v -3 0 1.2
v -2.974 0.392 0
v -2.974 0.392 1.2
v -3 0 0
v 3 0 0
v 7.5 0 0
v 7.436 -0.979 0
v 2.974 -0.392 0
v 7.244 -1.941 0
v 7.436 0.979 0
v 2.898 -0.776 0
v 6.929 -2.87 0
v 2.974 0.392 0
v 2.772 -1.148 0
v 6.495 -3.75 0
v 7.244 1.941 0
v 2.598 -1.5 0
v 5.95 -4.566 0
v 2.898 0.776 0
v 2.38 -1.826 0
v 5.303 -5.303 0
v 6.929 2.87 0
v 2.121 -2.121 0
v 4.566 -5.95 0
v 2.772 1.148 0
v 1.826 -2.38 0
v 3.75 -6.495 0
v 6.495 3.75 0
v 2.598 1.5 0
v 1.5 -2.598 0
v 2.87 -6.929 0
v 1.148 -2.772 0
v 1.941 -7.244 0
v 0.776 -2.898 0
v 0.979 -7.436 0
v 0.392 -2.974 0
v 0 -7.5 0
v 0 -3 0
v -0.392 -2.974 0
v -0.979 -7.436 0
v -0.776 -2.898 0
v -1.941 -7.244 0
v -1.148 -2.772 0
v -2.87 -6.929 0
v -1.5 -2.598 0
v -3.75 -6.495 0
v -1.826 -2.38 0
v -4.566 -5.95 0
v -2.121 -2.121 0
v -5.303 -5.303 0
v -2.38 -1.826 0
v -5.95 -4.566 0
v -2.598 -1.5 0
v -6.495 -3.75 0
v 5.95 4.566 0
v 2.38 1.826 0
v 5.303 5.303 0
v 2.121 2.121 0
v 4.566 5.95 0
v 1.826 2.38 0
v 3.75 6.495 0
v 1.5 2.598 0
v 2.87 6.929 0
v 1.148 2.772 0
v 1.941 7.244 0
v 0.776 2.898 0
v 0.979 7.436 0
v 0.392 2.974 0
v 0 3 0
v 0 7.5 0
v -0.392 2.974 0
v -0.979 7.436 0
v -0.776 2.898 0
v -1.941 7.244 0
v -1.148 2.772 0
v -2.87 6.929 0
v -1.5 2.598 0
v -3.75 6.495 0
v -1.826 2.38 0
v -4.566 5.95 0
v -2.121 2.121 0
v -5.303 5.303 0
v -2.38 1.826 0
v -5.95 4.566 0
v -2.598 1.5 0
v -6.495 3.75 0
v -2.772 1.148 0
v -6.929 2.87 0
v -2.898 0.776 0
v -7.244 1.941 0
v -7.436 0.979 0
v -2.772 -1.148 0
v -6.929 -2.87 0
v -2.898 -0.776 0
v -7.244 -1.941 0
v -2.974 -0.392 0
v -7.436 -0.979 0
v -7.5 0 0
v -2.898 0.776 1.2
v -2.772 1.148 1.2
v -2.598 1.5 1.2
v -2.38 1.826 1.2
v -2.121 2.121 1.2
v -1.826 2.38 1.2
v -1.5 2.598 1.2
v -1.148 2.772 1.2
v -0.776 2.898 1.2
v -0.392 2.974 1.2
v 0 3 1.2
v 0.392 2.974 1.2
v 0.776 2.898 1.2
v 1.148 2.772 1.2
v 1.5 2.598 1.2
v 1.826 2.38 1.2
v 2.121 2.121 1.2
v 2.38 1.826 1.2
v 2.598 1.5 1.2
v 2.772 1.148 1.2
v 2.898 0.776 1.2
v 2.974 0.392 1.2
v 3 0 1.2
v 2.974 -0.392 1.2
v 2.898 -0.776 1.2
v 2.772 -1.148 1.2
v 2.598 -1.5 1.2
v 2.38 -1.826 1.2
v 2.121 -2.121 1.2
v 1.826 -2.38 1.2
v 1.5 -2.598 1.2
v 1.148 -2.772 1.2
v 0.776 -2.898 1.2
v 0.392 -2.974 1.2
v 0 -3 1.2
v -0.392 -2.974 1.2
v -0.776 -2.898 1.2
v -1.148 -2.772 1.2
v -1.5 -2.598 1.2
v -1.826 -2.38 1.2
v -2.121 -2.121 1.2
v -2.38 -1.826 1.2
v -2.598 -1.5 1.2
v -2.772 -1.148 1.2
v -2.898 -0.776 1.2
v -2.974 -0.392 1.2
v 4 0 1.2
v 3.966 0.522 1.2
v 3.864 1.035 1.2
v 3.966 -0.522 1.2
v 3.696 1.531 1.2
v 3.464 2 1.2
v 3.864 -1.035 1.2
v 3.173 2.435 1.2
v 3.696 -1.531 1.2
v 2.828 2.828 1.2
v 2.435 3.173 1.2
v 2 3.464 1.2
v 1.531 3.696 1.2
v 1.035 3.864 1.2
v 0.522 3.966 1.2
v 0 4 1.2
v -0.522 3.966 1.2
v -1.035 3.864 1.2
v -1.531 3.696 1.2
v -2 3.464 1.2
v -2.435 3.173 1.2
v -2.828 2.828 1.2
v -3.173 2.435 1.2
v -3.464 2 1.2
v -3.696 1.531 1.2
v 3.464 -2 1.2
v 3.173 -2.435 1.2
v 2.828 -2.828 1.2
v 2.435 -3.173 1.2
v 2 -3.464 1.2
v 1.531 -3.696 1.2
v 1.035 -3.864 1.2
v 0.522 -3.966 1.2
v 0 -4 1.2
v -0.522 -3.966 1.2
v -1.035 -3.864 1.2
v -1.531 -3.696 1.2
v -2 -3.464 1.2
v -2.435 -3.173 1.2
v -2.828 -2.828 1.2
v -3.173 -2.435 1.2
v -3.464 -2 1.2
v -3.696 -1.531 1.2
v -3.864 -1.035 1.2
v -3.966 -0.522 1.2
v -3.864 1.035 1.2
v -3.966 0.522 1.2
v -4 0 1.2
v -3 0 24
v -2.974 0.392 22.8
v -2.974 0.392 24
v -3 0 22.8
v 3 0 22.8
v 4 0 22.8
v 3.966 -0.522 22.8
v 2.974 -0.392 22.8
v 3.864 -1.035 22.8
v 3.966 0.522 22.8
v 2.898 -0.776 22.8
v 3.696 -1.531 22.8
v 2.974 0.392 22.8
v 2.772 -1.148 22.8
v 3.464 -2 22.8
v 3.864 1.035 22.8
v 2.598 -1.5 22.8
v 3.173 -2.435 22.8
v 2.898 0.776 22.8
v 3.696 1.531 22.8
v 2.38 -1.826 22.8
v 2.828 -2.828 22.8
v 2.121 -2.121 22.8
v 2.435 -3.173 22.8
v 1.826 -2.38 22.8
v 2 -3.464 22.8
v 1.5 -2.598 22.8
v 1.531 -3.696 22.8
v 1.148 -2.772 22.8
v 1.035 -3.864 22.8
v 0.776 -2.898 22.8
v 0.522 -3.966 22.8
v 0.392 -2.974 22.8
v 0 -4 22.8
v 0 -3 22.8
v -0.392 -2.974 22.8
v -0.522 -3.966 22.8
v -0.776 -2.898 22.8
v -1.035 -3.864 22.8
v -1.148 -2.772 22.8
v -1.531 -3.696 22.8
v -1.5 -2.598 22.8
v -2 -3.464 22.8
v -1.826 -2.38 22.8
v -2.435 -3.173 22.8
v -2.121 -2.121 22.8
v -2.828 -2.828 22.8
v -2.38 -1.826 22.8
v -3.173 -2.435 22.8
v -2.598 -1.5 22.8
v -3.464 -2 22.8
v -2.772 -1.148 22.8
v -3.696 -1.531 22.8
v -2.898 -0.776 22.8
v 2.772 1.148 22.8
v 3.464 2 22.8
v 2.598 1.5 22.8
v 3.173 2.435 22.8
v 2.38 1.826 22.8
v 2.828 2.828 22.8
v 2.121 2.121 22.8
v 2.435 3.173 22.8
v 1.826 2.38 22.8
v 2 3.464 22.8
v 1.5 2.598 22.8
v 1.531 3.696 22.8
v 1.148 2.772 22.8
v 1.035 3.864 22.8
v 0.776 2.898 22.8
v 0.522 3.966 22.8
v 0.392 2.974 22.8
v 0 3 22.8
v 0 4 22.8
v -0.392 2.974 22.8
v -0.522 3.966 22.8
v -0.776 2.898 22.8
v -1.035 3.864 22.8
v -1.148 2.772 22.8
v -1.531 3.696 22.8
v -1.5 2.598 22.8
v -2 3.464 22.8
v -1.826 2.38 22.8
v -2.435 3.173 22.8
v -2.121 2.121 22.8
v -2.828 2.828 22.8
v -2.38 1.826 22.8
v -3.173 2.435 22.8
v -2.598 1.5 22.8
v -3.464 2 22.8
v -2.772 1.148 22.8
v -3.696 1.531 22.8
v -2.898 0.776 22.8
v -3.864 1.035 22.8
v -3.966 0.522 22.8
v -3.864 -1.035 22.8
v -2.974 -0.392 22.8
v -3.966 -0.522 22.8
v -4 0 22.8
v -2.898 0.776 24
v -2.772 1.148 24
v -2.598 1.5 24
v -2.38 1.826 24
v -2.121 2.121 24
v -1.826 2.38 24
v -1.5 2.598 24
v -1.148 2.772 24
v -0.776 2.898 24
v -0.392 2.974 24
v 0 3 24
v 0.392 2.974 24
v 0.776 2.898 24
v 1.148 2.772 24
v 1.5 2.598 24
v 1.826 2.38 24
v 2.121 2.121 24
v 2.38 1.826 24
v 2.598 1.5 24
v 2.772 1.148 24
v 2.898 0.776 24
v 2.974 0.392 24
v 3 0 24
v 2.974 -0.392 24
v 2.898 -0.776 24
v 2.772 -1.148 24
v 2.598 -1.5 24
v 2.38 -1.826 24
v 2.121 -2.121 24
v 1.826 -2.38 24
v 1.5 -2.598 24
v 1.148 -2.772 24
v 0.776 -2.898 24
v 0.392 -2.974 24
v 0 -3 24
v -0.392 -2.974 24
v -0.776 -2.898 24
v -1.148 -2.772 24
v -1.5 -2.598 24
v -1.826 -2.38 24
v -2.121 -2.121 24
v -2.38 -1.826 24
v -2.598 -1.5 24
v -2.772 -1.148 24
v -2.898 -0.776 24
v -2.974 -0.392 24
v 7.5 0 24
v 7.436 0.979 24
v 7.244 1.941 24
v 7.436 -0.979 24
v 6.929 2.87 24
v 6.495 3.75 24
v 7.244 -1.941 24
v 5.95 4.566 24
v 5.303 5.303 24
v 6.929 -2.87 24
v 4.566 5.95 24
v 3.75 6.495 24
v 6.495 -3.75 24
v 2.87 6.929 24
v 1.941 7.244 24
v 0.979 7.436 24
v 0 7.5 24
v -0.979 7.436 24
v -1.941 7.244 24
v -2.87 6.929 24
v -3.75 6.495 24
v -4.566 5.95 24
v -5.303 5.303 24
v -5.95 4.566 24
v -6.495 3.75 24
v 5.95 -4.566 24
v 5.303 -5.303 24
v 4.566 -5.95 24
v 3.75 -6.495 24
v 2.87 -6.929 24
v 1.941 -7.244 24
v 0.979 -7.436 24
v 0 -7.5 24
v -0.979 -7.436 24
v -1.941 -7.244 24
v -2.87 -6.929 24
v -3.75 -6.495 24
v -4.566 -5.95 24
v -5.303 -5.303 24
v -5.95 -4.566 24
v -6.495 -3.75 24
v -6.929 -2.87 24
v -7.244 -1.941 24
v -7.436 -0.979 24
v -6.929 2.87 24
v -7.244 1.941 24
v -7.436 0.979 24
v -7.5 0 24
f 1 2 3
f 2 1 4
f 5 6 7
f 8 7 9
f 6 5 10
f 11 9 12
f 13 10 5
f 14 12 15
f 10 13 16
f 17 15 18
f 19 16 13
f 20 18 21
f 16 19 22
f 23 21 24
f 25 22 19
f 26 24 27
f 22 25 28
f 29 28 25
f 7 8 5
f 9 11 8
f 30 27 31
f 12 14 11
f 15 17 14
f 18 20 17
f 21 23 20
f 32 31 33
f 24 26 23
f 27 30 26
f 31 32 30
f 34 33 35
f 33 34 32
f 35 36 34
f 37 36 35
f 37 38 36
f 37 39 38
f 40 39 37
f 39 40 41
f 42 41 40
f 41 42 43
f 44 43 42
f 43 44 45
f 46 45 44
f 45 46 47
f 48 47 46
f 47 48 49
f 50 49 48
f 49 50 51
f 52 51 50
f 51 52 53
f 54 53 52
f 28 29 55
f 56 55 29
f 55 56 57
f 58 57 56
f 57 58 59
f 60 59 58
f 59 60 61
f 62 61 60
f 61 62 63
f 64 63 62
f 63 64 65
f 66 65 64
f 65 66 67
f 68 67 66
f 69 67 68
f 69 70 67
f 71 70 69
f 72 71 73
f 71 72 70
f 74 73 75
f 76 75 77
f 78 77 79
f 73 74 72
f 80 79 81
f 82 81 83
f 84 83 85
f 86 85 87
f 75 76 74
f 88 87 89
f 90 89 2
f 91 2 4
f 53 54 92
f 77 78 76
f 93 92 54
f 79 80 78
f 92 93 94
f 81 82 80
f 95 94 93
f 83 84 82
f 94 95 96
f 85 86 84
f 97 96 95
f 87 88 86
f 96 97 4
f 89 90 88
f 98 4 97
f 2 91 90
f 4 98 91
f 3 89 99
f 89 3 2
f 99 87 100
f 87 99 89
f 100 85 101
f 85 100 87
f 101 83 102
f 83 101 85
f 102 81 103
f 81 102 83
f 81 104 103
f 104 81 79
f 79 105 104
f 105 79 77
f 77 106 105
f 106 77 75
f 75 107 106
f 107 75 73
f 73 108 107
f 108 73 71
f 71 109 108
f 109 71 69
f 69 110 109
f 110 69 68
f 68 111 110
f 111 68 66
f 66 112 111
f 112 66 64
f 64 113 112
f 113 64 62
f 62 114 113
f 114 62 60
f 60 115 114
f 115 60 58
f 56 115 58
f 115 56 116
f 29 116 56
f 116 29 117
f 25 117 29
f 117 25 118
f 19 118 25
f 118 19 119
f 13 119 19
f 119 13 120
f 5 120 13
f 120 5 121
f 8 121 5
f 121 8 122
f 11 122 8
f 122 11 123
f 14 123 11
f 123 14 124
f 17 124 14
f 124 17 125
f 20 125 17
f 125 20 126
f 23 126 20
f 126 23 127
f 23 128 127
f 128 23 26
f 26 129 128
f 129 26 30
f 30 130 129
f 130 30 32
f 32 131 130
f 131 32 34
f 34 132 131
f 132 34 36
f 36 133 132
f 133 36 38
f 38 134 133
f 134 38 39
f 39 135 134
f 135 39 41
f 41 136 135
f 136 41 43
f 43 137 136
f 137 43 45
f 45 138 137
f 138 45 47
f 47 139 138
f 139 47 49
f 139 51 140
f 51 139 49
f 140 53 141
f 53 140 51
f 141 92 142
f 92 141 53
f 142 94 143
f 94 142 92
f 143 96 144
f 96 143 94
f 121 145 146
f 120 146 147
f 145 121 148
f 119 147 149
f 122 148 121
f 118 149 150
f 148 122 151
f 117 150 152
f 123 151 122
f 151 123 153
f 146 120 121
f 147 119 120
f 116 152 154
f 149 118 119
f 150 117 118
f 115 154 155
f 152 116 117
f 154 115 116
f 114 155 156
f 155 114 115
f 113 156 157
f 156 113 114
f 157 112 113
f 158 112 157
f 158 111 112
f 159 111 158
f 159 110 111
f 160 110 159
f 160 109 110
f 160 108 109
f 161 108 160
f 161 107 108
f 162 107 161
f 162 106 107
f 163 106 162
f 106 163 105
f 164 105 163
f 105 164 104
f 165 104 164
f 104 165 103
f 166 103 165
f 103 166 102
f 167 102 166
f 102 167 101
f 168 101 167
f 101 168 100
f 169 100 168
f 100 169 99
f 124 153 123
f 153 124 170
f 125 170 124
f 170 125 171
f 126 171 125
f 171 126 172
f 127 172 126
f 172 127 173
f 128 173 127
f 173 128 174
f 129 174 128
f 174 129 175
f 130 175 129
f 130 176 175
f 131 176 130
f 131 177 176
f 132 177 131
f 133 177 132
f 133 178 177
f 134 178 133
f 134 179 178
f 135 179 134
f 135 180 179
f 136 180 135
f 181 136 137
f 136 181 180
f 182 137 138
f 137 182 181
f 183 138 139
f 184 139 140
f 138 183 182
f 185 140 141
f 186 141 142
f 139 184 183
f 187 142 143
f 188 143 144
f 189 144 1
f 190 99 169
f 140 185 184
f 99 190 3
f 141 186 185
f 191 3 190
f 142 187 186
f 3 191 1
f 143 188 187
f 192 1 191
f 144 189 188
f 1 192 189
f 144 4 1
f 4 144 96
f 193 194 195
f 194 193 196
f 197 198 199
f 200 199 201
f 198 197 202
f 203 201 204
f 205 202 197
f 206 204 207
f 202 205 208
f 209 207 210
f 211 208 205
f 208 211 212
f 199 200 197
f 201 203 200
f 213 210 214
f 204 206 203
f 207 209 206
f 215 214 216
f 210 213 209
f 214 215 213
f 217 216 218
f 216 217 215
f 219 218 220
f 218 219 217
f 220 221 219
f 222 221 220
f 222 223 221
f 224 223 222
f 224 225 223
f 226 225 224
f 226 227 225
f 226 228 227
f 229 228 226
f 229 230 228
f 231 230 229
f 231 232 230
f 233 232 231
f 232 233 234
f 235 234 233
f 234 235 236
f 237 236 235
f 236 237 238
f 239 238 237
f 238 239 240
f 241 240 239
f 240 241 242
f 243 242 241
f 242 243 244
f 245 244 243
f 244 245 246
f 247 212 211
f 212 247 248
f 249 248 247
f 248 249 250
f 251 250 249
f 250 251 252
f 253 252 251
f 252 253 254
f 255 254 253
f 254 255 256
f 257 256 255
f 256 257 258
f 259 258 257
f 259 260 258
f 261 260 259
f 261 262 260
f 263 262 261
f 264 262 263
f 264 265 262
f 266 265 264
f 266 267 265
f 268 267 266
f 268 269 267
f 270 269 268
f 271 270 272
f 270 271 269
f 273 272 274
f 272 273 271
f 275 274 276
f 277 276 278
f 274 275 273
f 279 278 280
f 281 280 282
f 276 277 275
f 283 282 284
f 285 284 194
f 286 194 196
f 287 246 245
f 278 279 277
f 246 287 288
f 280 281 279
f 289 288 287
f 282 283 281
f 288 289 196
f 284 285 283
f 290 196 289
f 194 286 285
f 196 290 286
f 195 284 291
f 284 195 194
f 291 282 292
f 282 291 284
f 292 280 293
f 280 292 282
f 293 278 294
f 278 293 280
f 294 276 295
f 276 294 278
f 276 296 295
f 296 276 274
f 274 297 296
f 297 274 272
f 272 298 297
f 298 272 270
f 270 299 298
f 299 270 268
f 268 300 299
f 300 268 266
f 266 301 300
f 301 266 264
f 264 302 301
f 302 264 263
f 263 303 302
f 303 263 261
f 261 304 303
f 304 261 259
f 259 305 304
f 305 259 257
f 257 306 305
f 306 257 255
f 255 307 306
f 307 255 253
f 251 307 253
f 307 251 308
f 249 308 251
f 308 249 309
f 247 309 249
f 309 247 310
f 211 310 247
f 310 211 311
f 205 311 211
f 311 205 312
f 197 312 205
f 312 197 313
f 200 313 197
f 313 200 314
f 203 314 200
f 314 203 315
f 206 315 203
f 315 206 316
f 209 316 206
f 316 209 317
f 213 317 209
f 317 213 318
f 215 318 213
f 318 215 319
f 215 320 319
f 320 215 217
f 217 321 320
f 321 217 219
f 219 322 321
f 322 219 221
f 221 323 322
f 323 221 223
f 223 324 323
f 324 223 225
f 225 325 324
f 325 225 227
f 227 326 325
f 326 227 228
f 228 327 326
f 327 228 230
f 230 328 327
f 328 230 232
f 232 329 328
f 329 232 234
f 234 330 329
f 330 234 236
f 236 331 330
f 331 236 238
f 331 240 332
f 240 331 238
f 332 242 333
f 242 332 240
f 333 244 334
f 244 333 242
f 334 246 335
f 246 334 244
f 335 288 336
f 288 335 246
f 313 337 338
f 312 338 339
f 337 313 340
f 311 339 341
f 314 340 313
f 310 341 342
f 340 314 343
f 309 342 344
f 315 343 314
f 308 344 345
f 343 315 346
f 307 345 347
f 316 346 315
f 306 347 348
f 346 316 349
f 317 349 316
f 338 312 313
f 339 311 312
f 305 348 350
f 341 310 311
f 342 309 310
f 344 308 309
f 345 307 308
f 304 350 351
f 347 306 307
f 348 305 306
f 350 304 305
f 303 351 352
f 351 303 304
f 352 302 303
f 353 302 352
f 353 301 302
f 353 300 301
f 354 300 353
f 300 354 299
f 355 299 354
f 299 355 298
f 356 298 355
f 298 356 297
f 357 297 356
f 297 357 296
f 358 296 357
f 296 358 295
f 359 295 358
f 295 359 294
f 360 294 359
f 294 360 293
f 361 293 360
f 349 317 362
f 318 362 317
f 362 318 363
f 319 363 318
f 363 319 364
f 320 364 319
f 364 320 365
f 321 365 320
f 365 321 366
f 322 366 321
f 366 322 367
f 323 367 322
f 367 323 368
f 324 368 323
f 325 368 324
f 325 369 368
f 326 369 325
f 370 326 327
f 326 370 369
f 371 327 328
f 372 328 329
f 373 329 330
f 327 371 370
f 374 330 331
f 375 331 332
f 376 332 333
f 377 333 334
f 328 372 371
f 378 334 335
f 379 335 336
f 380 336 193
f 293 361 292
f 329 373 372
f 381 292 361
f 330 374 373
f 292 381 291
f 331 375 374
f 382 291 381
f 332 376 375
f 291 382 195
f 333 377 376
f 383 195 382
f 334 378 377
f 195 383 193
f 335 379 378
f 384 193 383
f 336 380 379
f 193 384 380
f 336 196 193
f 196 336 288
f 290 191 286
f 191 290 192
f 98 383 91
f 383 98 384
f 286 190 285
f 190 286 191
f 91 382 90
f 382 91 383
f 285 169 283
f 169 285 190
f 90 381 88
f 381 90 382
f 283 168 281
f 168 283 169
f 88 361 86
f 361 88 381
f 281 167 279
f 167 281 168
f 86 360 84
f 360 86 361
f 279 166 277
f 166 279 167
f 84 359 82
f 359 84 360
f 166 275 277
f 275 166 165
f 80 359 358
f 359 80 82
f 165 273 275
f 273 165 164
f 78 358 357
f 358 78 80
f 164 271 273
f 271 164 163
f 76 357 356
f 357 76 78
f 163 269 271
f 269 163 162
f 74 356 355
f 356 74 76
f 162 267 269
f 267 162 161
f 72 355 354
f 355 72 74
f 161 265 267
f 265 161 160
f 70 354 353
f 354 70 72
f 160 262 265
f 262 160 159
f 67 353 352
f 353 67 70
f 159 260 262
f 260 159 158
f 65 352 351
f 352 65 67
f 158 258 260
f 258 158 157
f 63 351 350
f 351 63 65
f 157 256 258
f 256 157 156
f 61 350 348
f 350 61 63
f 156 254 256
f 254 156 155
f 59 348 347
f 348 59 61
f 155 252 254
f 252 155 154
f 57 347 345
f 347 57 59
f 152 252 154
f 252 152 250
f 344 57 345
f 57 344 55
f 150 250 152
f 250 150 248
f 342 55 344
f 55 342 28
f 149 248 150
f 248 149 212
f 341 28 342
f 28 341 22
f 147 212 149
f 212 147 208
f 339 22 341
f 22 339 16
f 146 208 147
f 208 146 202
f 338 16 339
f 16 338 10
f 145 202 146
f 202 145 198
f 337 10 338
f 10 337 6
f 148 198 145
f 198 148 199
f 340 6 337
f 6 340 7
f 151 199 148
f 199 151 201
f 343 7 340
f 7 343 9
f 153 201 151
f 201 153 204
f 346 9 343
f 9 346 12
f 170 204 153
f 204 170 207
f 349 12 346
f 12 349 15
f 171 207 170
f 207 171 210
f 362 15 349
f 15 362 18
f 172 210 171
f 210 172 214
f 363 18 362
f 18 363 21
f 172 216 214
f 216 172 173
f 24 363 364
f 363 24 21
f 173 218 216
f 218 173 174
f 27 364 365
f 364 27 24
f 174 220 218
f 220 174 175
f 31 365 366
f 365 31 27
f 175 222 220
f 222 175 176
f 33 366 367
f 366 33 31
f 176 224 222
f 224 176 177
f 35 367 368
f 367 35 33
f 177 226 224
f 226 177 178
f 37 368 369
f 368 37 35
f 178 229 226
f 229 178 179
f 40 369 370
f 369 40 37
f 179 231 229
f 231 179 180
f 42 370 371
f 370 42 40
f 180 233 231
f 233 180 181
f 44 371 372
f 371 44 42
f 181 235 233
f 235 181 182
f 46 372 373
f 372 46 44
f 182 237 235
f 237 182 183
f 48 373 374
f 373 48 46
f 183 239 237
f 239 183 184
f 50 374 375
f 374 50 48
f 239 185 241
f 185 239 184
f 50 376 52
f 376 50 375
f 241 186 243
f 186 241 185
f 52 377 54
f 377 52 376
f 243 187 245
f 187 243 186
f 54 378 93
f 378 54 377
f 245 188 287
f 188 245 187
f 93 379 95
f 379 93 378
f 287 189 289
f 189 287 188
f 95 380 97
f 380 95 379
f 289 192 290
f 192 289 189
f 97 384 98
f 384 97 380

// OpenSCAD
// file: ../config.scad
// SCARA 로봇 공통 사양(specification) — 모든 부품 파일에서 include해 사용한다.

$fn = 48;

// ── 공차(tolerance) ──
print_clearance = 0.2;   // FDM 출력 끼워맞춤(fit) 여유 — 압입(press-fit) 자리 제외
eps             = 1/128; // 미세 겹침(epsilon) — 접하는 솔리드를 살짝 겹쳐 동일면(coincident face) z-파이팅 방지

// ── FDM 출력 사양(print specification) ──
fdm_layer_h       = 0.28;   // 레이어 높이(layer height) — 슬라이서(slicer) 설정값과 일치시킨다.
fdm_shoulder_layers = 6;   // 숄더(shoulder) 최소 레이어 수 — FDM 최소 구조 벽(0.4mm 노즐 3겹 ~1.2mm) 기준 하한값.

// ── 레이아웃(layout) ──
// layout_margin — 플레이트 위 부품 배치 공통 여백(margin). 부품 외곽선에서
// 사방으로 주는 값 → 부품끼리는 2*margin 이격, 외곽 가장자리도 margin 확보.
layout_margin = 4;

// ── 시트 형상(seat geometry) ──
// seat_shoulder_t — fdm_layer_h · fdm_shoulder_layers 파생. 슬라이서 설정 변경 시 자동 연동.
seat_shoulder_t = fdm_layer_h * fdm_shoulder_layers;
// main file
/*
 * linear_bearings.scad - 리니어 볼 베어링(linear ball bearing) 기성품(vitamin)
 *
 * 리니어 샤프트(linear shaft)를 따라 직선 안내(linear guide)하는 LM8UU
 * 볼 부싱(ball bushing) 시각화용 모델(보어 8 x OD 15 x 길이 24).
 *
 * Z 브레이크포인트(Z breakpoint) 최적화: 강철 셸(steel shell)은 회전 대칭
 * (rotationally symmetric)이라 외곽(outer)과 보어(bore)를 동시에 그리는
 * 환형(annular) 단면 한 개의 단일 rotate_extrude로 만든다 — union·
 * difference 없음. 양 끝 씰(seal) 링만 색상이 갈리므로 별도 rotate_extrude
 * 두 개로 그린다.
 *
 * 좌표계: 축(axis) = Z, 길이(length)는 z=0..length.
 */

include <../config.scad>

/* --- 형상 비율(cosmetic) --- */
seal_t		= 1.2;	/* 씰(seal) 링 축방향(axial) 두께 */
seal_inset	= 1.0;	/* 씰 보어 반경 인셋(inset) — 셸보다 안쪽으로 돌출 */

/* --- 색상(cosmetic) --- */
c_shell		= [0.55, 0.56, 0.59];	/* 강철 셸(steel shell) */
c_seal		= [0.12, 0.12, 0.13];	/* 양 끝 씰(seal) — 고무(rubber) */

/*
 * 리니어 볼 베어링 — bore_d(보어) x od(외경) x length(길이). 강철 셸은
 * 외경과 보어 사이의 환형(annular) 단면을 단일 rotate_extrude로 돌려
 * 만들고, 양 끝에 고무 씰(seal) 링을 보어 안쪽으로 인셋(inset)해 끼운다.
 */
module linear_bearing(bore_d, od, length)
{
	br = bore_d / 2;	/* 보어 반지름 */
	or = od / 2;		/* 외경 반지름 */
	sr = br - seal_inset;	/* 씰(seal) 내경 반지름 — 샤프트 접촉(contact) */

	/* 강철 셸(steel shell) — 외곽·보어 동시(환형 단면 단일 회전체) */
	color(c_shell)
		rotate_extrude(convexity = 4)
			polygon([[br, 0], [or, 0],
				 [or, length], [br, length]]);

	/*
	 * 씰(seal) 링 — 양 끝에서 보어 안쪽으로 돌출해 샤프트를 닦고
	 * 그리스(grease)를 가둔다. 색상이 셸과 갈려 별도 회전체로 둔다.
	 */
	module seal_ring(z0, z1)
		rotate_extrude(convexity = 2)
			polygon([[sr, z0], [br + eps, z0],
				 [br + eps, z1], [sr, z1]]);

	color(c_seal) {
		seal_ring(0, seal_t);			/* 하단 씰 */
		seal_ring(length - seal_t, length);	/* 상단 씰 */
	}
}

/* --- 표준 변형(convenience) --- */
module lm8uu() { linear_bearing(8, 15, 24); }	/* ⌀8 샤프트 리니어 가이드 */

lm8uu();
